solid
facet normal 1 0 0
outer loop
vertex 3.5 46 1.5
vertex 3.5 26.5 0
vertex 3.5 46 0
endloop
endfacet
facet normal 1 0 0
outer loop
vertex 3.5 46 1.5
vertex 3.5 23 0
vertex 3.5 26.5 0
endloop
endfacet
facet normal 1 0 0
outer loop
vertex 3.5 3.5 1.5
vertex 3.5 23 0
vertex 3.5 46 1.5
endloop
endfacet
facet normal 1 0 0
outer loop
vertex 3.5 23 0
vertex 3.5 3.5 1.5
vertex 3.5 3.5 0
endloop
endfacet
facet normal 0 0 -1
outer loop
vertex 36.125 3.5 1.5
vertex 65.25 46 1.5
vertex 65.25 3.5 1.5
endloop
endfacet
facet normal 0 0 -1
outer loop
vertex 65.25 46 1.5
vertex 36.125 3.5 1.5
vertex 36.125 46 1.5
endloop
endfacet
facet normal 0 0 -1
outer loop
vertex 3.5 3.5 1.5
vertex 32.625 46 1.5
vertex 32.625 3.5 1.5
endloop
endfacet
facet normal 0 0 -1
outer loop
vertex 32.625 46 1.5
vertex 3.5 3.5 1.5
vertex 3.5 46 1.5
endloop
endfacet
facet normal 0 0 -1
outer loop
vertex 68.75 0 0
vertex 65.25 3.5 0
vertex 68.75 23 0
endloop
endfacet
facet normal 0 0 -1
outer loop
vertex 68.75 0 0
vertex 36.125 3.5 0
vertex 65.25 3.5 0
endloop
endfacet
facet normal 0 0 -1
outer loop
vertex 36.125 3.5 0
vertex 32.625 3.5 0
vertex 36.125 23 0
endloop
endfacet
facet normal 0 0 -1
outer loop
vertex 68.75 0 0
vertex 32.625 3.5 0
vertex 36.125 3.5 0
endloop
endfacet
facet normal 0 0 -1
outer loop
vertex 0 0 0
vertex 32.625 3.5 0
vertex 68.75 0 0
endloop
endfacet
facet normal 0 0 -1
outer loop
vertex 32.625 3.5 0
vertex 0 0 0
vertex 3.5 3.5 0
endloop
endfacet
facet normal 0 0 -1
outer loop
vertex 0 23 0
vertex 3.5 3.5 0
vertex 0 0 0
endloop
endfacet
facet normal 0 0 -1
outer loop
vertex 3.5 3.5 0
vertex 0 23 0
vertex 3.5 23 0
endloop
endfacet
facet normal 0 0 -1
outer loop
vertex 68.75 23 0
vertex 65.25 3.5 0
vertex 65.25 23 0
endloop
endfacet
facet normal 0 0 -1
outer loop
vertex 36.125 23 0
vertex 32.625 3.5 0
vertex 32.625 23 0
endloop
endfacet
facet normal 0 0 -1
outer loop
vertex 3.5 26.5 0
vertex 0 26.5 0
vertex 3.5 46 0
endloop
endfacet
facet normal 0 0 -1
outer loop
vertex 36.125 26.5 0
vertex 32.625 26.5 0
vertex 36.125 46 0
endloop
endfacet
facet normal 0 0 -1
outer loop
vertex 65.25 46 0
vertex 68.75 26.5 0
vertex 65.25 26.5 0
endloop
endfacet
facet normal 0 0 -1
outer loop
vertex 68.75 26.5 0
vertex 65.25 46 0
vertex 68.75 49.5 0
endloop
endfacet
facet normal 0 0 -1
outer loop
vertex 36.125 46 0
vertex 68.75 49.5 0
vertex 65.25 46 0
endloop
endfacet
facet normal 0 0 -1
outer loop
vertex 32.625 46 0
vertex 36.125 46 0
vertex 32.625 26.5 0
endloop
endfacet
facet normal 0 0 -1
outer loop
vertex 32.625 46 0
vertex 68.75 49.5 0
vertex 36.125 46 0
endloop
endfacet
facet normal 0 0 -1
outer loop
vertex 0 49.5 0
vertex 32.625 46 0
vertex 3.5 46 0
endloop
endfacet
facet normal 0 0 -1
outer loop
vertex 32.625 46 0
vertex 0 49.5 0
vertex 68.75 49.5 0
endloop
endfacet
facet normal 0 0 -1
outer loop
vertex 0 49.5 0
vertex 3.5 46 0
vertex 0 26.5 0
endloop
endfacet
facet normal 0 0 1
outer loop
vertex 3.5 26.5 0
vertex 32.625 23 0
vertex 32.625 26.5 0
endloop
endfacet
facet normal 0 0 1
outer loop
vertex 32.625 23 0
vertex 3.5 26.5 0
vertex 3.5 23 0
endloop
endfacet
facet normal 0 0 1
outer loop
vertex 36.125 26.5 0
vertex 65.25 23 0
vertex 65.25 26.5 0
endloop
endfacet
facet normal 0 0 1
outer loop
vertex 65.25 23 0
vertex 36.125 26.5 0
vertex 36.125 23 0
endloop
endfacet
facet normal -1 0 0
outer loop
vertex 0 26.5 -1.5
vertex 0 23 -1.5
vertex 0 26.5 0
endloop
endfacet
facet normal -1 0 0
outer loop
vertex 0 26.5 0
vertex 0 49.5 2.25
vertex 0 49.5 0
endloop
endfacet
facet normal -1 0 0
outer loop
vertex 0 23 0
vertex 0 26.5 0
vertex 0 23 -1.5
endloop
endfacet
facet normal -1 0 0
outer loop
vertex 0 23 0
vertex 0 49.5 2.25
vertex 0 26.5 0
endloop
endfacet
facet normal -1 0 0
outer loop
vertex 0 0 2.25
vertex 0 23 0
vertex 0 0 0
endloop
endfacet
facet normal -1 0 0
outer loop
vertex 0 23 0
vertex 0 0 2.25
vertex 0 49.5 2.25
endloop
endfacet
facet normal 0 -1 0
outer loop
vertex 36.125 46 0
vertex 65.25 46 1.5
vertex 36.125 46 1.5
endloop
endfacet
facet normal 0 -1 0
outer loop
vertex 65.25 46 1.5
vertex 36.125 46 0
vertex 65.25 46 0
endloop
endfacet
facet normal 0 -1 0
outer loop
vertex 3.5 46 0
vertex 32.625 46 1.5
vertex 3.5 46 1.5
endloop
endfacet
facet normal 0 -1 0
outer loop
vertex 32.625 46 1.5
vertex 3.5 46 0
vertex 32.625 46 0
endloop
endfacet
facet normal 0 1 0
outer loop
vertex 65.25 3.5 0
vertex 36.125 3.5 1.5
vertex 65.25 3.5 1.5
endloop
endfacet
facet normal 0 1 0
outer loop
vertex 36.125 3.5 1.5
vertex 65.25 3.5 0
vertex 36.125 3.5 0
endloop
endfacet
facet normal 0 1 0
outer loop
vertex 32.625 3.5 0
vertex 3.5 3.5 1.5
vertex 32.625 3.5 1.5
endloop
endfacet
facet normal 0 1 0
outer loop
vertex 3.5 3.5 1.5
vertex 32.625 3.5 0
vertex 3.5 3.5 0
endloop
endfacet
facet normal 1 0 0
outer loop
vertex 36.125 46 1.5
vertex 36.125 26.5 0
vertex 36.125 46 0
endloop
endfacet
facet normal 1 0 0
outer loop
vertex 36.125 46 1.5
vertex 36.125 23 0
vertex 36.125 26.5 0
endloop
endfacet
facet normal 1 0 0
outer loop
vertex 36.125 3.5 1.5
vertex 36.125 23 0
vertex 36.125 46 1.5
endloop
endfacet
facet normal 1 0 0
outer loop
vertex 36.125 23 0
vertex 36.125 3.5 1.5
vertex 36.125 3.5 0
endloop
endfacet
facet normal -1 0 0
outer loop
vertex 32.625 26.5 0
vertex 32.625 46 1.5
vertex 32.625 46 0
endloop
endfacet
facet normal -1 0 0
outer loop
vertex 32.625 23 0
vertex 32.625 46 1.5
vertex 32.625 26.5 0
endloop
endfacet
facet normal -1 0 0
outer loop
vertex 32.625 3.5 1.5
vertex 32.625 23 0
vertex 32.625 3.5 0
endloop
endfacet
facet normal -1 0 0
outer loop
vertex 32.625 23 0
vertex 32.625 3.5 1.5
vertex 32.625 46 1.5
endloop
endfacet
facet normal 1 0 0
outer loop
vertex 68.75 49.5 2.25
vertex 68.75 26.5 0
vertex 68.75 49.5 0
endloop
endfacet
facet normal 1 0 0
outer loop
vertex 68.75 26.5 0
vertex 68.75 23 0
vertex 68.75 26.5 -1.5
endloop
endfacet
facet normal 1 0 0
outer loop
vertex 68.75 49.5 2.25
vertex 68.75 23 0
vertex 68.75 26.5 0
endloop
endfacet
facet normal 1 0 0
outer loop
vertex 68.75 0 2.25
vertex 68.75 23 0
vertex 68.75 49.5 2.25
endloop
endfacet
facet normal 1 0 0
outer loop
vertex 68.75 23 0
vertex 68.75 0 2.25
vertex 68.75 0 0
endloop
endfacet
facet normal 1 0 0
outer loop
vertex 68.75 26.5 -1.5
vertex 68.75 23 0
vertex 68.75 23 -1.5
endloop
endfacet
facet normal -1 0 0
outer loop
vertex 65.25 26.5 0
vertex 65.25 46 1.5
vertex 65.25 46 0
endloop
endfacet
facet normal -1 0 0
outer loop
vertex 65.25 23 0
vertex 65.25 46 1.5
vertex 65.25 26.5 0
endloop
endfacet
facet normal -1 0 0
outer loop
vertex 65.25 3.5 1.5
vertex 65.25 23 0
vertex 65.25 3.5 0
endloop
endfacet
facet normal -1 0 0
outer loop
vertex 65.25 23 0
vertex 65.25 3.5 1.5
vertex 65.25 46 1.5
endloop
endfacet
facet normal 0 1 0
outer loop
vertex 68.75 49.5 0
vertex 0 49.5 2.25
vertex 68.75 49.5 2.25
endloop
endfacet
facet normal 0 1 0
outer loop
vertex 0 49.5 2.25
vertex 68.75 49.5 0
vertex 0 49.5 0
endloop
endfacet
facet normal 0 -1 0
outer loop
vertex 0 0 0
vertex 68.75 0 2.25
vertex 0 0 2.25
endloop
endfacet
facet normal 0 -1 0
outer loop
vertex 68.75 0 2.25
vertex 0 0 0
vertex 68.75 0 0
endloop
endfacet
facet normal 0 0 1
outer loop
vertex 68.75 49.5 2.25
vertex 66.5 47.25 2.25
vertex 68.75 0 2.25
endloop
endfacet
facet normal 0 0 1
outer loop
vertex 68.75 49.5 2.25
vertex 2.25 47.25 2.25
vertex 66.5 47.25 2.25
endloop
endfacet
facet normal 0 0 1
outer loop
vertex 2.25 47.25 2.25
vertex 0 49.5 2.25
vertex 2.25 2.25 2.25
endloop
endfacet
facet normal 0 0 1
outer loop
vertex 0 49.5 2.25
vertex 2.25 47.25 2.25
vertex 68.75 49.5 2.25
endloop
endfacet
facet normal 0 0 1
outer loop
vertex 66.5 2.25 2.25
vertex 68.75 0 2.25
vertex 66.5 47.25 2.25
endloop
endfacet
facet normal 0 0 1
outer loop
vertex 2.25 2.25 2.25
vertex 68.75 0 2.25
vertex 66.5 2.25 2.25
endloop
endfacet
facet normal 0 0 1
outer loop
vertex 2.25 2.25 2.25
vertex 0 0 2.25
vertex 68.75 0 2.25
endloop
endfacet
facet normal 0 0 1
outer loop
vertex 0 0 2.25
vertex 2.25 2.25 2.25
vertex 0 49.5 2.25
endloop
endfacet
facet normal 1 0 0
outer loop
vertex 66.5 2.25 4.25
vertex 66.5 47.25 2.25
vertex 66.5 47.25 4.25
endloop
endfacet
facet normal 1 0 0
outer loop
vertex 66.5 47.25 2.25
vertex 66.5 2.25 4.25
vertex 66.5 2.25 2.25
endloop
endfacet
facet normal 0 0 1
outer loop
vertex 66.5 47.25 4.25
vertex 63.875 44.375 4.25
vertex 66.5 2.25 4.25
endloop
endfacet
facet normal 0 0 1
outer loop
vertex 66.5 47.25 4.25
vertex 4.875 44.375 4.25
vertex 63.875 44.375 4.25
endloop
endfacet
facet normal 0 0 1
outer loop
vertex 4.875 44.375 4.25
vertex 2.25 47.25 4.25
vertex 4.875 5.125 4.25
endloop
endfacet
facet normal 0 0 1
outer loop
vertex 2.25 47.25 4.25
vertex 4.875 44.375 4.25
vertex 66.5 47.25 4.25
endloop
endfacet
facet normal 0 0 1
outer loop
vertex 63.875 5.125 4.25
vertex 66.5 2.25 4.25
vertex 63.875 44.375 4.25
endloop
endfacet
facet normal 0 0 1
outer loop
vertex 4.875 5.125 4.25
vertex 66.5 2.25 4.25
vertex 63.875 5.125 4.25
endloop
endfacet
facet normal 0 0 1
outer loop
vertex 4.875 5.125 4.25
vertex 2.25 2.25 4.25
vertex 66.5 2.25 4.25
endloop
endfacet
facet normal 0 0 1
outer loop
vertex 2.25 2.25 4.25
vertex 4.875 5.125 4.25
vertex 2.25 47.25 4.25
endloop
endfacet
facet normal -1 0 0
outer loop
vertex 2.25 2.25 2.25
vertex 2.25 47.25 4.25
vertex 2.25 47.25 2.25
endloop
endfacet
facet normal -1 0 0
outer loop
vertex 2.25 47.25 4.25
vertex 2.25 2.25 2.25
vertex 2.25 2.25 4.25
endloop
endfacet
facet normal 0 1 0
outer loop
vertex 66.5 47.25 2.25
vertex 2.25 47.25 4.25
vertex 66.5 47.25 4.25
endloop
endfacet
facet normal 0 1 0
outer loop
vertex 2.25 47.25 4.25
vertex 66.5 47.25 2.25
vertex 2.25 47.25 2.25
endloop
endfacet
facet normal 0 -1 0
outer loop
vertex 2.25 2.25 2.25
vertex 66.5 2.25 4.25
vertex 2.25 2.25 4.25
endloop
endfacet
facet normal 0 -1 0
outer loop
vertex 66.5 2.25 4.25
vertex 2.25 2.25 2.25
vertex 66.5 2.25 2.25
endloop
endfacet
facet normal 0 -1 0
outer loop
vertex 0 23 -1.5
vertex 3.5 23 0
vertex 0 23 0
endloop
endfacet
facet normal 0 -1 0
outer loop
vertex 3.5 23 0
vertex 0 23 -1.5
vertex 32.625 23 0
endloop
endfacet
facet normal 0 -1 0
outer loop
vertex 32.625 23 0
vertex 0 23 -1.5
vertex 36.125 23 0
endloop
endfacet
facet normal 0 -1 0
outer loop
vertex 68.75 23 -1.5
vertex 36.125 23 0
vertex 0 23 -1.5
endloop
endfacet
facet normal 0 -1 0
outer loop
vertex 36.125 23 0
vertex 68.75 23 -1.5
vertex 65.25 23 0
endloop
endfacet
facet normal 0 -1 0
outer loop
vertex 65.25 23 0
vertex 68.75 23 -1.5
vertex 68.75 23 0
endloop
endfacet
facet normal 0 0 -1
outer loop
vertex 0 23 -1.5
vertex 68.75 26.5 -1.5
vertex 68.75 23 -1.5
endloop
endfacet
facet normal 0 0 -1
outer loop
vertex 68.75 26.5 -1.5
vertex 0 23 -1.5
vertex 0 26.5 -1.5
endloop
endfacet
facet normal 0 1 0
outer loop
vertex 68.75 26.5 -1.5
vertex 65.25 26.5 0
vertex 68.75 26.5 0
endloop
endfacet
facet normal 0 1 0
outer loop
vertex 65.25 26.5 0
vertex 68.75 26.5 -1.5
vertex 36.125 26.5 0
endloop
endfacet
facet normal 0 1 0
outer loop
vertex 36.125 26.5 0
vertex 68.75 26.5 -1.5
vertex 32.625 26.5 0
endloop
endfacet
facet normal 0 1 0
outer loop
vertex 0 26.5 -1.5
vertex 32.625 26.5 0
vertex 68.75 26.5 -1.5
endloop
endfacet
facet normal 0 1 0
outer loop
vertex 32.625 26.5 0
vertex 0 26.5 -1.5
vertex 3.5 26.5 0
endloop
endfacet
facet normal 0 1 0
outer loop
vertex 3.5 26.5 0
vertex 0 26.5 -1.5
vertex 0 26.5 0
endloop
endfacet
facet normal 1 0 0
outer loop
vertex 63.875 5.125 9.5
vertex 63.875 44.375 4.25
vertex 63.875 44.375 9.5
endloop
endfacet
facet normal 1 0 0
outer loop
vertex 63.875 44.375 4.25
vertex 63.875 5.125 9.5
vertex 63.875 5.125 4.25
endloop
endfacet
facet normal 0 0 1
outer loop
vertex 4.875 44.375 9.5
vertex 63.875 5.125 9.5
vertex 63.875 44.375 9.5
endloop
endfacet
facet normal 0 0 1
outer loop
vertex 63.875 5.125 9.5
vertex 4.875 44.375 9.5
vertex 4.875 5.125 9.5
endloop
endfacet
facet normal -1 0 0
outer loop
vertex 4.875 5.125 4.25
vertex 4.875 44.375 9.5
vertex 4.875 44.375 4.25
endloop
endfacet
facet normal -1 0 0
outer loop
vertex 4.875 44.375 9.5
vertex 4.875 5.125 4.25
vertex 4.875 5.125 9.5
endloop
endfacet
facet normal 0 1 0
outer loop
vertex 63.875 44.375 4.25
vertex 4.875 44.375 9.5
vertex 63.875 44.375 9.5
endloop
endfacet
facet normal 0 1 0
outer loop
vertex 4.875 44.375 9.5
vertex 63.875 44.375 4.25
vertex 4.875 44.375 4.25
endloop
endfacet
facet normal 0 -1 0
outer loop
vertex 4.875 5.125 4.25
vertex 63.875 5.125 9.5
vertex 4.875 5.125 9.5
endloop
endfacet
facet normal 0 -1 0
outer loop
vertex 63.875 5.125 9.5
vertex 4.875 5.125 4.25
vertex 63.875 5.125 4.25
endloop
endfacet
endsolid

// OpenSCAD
// !!!!! ALL UNITS ARE IN INCHES !!!!! 
// (sorry, don't have my metric measuring tape at home and Home Depot sells in inches)

// Dimensions of the actual painting
PAINTING_X = 57.75;
PAINTING_Y = 38;
PAINTING_Z = 4.25;

// Dimensions of the foam corners put on the painting
FOAM_CORNER_THICKNESS = 1.25;
FOAM_CORNER_Z_THICKNESS = 1;
FOAM_CORNER_X = 6;
FOAM_CORNER_Y = 5 + 9/16;
FOAM_CORNER_Z = 5 + 3/16;
FOAM_CORNER_INSIDE = 3.25;

// The total thickness of any foam used to insulate around the painting in the crate
// I'm using 2" thick ridgid insulation foam around all walls
// then filling in gaps with 3/32" packing foam
TOTAL_INSULATION_THICKNESS = 2;

// Dimentions of the board being used as the structure of the crate
BOARD_WIDTH = 3.5;
BOARD_THICKNESS = 1.5;

// Thickness of the plywood
PLYWOOD_THICKNESS = .75;

// !! need to raise from the sides to get the foam corners snug !!

/**
 * Creates a board with a specified length.
 *
 * @param length Length of the board to create
 * @param rotate_90 make a board that is rotated 90 degrees
 */
module board (length, rotate_vertical=false, rotate_horizontal=false) {
    // TODO add the length to an array that prints at the end to show what to buy
    x_translate = (rotate_vertical ? BOARD_THICKNESS : 0) 
                  + (rotate_horizontal ? length : 0);
    translate([x_translate, 0, 0])
        rotate([0,(rotate_vertical) ? -90 : 0,(rotate_horizontal) ? 90 : 0])
            cube([BOARD_WIDTH, length, BOARD_THICKNESS]);
}

module plywood(x, y, rotate_90=false) {
    translate([(rotate_90) ? PLYWOOD_THICKNESS : 0,0,0])
        rotate([0,(rotate_90) ? -90 : 0,0])
            cube([x, y, PLYWOOD_THICKNESS]);
}

module insulation(x, y, rotate_90=false) {
    translate([(rotate_90) ? TOTAL_INSULATION_THICKNESS : 0,0,0])
        rotate([0,(rotate_90) ? -90 : 0,0])
            cube([x, y, TOTAL_INSULATION_THICKNESS]);
}

// Terminology:
//  Face: Large side of crate, one for the front and back of painting
//  Long Side: One of the sides of the crate that runs along the X axis
//  Short Side: One of the sides of the crate that runs along the Y axis

crate_piece_thickness = (BOARD_THICKNESS+PLYWOOD_THICKNESS);
total_crate_piece_thickness = (BOARD_THICKNESS+PLYWOOD_THICKNESS+TOTAL_INSULATION_THICKNESS);

// Accounts for:
//  * The size of the painting
//  * Insulation on both sides of the painting
//  * Plywood on both sides of the painting (for smaller sides of crate)
//  * Boards on both sides of the crate
//  * Foam corners
face_long_board_length = PAINTING_X 
                         + total_crate_piece_thickness * 2 
                         + FOAM_CORNER_THICKNESS * 2;

face_short_board_length = PAINTING_Y
                          + crate_piece_thickness * 2;

// Y axis side pieces
side_vertical_pieces = PAINTING_Z
                       + PLYWOOD_THICKNESS * 2
                       - crate_piece_thickness * 2
                       + FOAM_CORNER_THICKNESS * 2;

// Z axis crate pieces                       
side_vertical_board_length = face_short_board_length 
                             + BOARD_WIDTH * 2
                             - crate_piece_thickness * 2;
                       
// TODO just make an inner dimention variable and base everything off that

module create_piece(total_length, short_length, insulation_type="side") {
    // Bottom board
    board(total_length, rotate_horizontal=true);
    translate([0,BOARD_WIDTH,0]) {
        // Three vertical boards
        color("Red",1.0) {
            // Left
            board(short_length);
            // Middle
            translate([total_length/2 - BOARD_WIDTH / 2,0,0])
                board(short_length);
            // Right
            translate([total_length - BOARD_WIDTH,0,0])
                board(short_length);

        }
        // Top board
        translate([0,short_length,0])
            board(total_length, rotate_horizontal=true);
    }
    // Plywood
    color("Green",1.0)
        translate([0,0,BOARD_THICKNESS])
            plywood(total_length, 
                    short_length + BOARD_WIDTH * 2);
    // Insulation
    if (insulation_type == "side")
    color("Blue",1.0)
        translate([crate_piece_thickness,crate_piece_thickness,crate_piece_thickness])
            insulation(total_length - crate_piece_thickness * 2, 
                       short_length + BOARD_WIDTH * 2 - crate_piece_thickness * 2);
    else if (insulation_type == "face")
        color("Purple",1.0)
        translate([crate_piece_thickness,crate_piece_thickness,crate_piece_thickness])
            insulation(total_length - crate_piece_thickness * 2, 
                       short_length + BOARD_WIDTH * 2 - crate_piece_thickness * 2);
}

module crate_face() {
    create_piece(face_long_board_length, face_short_board_length, insulation_type="face");
    translate([0,BOARD_WIDTH / 2 + face_short_board_length / 2,-BOARD_THICKNESS])
        board(face_long_board_length, rotate_horizontal=true);
}

module crate_long_side() {
    create_piece(face_long_board_length, side_vertical_pieces);
}

module crate_short_side() {
    create_piece(side_vertical_board_length, side_vertical_pieces);
}

module foam_corner() {
    difference() {
        color("Olive",1.0)
        cube([FOAM_CORNER_X,FOAM_CORNER_Y,FOAM_CORNER_Z]);
        //translate([(FOAM_CORNER_X-FOAM_CORNER_INSIDE)/2,
        //           (FOAM_CORNER_Y-FOAM_CORNER_INSIDE)/2,
        //           (FOAM_CORNER_Z-FOAM_CORNER_INSIDE)/2])
        //cube([FOAM_CORNER_INSIDE*1.4,FOAM_CORNER_INSIDE*1.1,FOAM_CORNER_INSIDE]);
    }
}

module painting(show_corners_separately=false) {
    if (show_corners_separately) {
        foam_corner_x_translate = PAINTING_X-(FOAM_CORNER_X-FOAM_CORNER_INSIDE);
        foam_corner_y_translate = PAINTING_Y-(FOAM_CORNER_Y-FOAM_CORNER_INSIDE);
        
        color("Goldenrod",1.0)
            translate([(FOAM_CORNER_X-FOAM_CORNER_INSIDE)/2,
                       (FOAM_CORNER_Y-FOAM_CORNER_INSIDE)/2,
                       (FOAM_CORNER_Z-PAINTING_Z)/2])
            cube([PAINTING_X,PAINTING_Y,PAINTING_Z]);
        foam_corner();
        translate([foam_corner_x_translate,0,0])
            foam_corner();
        translate([0,foam_corner_y_translate,0])
            foam_corner();
        translate([foam_corner_x_translate,foam_corner_y_translate,0])
                foam_corner();
    } else {
        color("Goldenrod",1.0)
            cube([PAINTING_X+FOAM_CORNER_THICKNESS,
                  PAINTING_Y+FOAM_CORNER_THICKNESS,
                  PAINTING_Z+FOAM_CORNER_Z_THICKNESS]);
    }
}

module painting_on_face() {
    crate_face();
    translate([(face_long_board_length-PAINTING_X-FOAM_CORNER_THICKNESS)/2,
               (face_short_board_length+BOARD_WIDTH*2-PAINTING_Y-FOAM_CORNER_THICKNESS)/2,
               crate_piece_thickness+TOTAL_INSULATION_THICKNESS])
        painting();
}

HIDE_ONE_FACE = true;
HIDE_ONE_SIDE = false;
SHOW_PAINTING = true;

module crate() {
    translate([face_long_board_length,0,0])
        rotate([90,0,180])
            if (SHOW_PAINTING)
                painting_on_face();
            else
                crate_face();
    if (!HIDE_ONE_FACE)
    translate([0,crate_piece_thickness*2+side_vertical_pieces+BOARD_WIDTH*2,0])
        rotate([90,0,0])
            crate_face();
    // Bottom long side
    translate([0,crate_piece_thickness,0])
        crate_long_side();
    // Top long side
    translate([face_long_board_length,crate_piece_thickness,side_vertical_board_length+total_crate_piece_thickness+PLYWOOD_THICKNESS])
        rotate([180,0,180])
            crate_long_side();
    if (!HIDE_ONE_SIDE)
    translate([0,crate_piece_thickness,side_vertical_board_length+crate_piece_thickness])
        rotate([0,90,0])
            crate_short_side();
    translate([face_long_board_length,crate_piece_thickness,crate_piece_thickness])
        rotate([0,-90,0])
            crate_short_side();
}

module check_for_intersections_with_crate() {
    render()
    difference() {
        crate();
        translate([face_long_board_length,0,0])
            rotate([90,0,180])
                painting_on_face();
    }
}

//painting();
//crate();
painting_on_face();
//check_for_intersections_with_crate();
//crate_short_side();
